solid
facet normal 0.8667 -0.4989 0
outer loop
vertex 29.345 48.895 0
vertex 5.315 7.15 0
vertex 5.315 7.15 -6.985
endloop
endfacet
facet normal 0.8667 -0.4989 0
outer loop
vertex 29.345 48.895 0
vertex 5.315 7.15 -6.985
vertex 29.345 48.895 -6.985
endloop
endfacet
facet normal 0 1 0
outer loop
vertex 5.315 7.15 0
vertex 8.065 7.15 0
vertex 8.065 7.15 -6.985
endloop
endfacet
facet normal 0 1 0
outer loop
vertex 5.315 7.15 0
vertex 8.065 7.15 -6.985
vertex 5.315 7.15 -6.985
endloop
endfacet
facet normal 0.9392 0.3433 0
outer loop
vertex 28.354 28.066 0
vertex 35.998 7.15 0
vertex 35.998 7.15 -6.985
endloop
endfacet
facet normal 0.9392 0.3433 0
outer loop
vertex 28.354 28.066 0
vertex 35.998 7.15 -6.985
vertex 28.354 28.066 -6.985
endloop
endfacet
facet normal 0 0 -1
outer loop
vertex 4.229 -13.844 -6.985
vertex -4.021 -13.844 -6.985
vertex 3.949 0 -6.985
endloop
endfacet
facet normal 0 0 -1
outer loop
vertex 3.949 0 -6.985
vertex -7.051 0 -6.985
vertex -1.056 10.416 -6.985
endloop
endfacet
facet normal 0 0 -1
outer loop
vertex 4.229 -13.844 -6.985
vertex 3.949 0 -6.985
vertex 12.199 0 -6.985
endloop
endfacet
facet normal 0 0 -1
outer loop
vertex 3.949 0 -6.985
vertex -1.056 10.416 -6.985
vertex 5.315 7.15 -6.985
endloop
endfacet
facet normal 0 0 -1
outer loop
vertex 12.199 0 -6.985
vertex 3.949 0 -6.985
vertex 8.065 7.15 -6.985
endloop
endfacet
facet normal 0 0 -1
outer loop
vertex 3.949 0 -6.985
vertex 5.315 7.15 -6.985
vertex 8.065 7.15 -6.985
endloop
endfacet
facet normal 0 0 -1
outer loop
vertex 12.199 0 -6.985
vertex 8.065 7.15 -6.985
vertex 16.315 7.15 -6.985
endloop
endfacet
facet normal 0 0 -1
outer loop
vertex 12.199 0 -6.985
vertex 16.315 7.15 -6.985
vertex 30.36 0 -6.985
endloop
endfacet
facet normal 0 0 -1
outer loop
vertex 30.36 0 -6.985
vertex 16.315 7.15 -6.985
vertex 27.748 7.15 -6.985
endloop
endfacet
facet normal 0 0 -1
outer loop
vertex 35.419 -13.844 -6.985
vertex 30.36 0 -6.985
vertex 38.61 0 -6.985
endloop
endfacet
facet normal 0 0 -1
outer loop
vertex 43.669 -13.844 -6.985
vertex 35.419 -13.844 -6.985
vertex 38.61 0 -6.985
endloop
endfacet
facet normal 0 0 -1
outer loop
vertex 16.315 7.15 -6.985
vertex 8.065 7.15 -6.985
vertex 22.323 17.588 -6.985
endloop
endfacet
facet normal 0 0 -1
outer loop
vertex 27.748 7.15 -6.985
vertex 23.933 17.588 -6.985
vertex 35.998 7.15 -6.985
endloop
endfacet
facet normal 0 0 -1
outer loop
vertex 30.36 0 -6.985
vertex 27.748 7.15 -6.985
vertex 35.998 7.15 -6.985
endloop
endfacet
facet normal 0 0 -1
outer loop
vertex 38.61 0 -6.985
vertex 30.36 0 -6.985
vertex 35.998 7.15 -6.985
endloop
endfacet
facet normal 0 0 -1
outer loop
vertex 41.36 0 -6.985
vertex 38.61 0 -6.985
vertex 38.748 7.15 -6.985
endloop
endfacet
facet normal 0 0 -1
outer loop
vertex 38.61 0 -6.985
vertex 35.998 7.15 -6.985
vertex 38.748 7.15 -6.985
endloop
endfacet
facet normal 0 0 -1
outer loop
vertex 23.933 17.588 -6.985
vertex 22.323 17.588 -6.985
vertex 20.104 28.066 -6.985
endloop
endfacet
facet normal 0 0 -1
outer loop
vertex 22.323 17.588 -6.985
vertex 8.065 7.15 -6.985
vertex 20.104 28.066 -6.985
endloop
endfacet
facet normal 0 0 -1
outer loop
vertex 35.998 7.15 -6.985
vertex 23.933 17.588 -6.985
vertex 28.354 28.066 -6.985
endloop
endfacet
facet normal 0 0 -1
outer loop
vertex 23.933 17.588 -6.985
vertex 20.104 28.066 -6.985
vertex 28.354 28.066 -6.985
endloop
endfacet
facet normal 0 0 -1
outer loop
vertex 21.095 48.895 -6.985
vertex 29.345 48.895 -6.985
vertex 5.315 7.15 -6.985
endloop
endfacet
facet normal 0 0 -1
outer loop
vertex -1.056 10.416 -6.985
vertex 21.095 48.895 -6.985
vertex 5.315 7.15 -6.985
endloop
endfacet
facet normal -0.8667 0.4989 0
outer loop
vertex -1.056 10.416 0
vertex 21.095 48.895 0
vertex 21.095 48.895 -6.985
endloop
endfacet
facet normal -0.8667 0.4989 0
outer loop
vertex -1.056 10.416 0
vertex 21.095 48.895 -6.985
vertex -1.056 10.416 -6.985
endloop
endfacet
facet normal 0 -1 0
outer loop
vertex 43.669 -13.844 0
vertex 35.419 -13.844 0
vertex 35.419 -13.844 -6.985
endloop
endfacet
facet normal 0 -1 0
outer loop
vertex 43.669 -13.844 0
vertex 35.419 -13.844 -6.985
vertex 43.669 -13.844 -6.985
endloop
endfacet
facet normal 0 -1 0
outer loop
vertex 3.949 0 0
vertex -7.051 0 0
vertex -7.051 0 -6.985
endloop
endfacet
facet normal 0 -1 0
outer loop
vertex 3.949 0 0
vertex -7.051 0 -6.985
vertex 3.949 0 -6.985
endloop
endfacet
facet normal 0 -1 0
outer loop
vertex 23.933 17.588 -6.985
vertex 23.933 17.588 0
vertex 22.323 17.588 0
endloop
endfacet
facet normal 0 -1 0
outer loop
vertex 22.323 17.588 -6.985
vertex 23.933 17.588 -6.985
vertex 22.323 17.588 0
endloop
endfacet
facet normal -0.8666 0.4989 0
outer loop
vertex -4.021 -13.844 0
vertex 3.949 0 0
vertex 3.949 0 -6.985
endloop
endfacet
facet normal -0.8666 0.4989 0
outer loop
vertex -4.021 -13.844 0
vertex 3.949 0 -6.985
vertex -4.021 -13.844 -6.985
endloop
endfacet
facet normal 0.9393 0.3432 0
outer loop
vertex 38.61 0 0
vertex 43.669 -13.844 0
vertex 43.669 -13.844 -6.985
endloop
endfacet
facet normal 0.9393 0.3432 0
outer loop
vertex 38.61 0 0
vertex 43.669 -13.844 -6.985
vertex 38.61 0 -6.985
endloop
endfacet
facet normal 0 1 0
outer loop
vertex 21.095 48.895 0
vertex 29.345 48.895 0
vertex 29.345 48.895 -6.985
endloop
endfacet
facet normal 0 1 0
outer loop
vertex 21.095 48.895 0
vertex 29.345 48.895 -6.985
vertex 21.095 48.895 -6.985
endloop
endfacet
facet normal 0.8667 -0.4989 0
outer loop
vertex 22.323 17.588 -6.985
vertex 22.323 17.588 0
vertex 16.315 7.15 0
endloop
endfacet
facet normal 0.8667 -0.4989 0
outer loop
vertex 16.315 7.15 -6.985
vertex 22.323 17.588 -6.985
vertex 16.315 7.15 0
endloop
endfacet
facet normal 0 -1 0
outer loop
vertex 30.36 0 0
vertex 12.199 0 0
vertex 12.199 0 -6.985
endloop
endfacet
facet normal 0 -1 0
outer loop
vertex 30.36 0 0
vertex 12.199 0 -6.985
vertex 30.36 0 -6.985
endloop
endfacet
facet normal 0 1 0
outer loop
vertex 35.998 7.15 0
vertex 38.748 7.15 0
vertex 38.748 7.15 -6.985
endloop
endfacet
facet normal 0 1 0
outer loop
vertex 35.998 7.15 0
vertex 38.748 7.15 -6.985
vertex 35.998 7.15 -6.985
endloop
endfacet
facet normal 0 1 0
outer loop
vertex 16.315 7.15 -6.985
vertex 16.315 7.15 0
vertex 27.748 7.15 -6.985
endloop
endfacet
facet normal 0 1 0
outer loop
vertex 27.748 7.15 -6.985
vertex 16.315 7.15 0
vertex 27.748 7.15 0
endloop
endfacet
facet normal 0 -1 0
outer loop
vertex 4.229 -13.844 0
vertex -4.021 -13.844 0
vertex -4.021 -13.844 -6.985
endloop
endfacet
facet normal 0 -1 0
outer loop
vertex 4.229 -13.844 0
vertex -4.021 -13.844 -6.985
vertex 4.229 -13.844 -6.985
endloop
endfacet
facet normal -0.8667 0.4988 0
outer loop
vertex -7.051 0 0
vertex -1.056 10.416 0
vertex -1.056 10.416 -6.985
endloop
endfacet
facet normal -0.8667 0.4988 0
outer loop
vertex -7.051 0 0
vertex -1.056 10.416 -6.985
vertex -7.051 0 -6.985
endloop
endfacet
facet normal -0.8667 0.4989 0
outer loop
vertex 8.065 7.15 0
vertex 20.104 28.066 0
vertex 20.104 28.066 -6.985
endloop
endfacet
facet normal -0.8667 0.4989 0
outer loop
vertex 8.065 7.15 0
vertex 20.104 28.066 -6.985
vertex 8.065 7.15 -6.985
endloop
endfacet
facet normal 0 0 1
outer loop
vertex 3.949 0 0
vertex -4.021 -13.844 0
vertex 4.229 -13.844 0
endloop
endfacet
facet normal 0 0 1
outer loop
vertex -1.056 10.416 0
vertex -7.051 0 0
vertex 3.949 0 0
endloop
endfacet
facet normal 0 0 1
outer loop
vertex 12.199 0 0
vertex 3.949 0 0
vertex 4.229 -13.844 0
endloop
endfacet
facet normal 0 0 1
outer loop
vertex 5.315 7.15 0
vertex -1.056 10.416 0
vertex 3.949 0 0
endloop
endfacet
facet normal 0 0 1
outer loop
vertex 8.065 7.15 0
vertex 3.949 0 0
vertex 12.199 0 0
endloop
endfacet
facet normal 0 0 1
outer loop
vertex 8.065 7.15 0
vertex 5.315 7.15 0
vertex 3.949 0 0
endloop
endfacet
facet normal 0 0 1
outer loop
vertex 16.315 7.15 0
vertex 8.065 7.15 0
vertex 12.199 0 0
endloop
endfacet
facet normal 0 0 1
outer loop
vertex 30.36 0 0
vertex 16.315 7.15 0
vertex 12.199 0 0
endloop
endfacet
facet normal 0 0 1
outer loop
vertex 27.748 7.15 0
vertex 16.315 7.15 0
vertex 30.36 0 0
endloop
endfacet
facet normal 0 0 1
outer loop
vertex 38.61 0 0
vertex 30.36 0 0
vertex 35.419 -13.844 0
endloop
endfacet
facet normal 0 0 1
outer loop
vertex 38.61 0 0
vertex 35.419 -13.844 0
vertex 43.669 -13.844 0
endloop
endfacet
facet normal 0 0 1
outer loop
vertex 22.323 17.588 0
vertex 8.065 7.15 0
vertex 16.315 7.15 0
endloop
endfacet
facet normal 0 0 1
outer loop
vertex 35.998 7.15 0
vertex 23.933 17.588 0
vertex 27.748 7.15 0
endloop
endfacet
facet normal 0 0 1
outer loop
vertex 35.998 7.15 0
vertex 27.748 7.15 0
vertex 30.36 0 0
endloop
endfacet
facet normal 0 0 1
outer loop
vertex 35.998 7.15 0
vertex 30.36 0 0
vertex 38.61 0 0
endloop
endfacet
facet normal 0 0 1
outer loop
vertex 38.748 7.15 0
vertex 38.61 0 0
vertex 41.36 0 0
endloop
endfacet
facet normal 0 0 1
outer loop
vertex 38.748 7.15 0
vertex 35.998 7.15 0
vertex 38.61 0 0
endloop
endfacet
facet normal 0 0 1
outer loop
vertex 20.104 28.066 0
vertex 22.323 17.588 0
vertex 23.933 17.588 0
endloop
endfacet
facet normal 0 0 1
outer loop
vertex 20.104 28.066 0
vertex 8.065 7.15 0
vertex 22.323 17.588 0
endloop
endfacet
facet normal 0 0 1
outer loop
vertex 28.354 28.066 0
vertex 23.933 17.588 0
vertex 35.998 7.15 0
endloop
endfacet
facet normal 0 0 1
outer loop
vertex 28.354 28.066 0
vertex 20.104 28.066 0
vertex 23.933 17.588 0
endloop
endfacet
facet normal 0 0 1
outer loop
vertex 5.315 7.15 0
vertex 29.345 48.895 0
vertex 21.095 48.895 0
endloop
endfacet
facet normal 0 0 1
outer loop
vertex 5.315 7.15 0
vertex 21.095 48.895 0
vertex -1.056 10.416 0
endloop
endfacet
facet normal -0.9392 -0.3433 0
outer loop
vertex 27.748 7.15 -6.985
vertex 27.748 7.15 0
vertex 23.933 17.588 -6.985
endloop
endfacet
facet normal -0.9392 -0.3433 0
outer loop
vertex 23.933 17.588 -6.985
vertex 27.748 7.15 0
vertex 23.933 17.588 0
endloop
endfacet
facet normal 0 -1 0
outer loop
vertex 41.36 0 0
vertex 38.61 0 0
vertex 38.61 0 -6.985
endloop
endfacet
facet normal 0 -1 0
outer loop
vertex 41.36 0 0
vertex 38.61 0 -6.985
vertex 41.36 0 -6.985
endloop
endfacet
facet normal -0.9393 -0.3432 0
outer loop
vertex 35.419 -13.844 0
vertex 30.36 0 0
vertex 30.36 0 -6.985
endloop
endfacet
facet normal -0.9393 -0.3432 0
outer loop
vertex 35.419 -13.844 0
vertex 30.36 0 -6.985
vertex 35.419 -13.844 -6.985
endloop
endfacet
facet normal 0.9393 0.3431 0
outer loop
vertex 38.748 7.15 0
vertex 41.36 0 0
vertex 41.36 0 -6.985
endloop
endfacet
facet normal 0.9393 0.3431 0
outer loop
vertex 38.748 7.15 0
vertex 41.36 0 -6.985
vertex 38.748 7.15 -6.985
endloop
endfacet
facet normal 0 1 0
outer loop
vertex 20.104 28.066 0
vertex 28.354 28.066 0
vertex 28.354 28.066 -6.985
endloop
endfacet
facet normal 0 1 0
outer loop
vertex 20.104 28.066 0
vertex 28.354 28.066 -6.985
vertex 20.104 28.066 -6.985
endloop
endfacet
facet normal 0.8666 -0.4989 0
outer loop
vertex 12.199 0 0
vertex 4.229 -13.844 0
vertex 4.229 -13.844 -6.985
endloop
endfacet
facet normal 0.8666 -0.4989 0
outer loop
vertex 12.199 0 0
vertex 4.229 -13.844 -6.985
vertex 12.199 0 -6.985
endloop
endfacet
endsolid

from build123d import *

# Parameters (mm, degrees)
BASE_FLANGE1_DEPTH = 12.7
CUT_EXTRUDE1_DEPTH = 120.869459796
SCALE1_SCALE       = 0.55


# Sheet-metal steps are written as plain solids
with BuildPart() as part:
    # Sketch2 → Base-Flange1 (new body)
    with BuildSketch(Plane.XY):
        Polygon((0, 0), (7.179503017, 0), (-7.310206248, -25.171495006), (7.689793752, -25.171495006), (22.179503017, 0), (55.200620493, 0), (64.398913039, -25.171495006), (79.398913039, -25.171495006), (70.200620493, 0), (75.200620493, 0), (70.450096018, 13), (65.450096018, 13), (51.553531117, 51.028504994), (36.553531117, 51.028504994), (14.662817791, 13), (9.662817791, 13), (53.353863276, 88.9), (38.353863276, 88.9), (-1.919318718, 18.937505869), (-12.820496983, 0), align=None)
    extrude(amount=-BASE_FLANGE1_DEPTH)

    # Sketch12 → Cut-Extrude1 (cut, through all)
    with BuildSketch(Plane.XY):
        Polygon((29.662817791, 13), (50.450096018, 13), (43.514747433, 31.978858458), (40.587800243, 31.978858458), align=None)
    extrude(amount=-CUT_EXTRUDE1_DEPTH, mode=Mode.SUBTRACT)


with BuildPart() as part_1:
    # Scale1: scaled about (0, 0, 0)
    add(part.part.scale(SCALE1_SCALE))


solid = part_1.part
